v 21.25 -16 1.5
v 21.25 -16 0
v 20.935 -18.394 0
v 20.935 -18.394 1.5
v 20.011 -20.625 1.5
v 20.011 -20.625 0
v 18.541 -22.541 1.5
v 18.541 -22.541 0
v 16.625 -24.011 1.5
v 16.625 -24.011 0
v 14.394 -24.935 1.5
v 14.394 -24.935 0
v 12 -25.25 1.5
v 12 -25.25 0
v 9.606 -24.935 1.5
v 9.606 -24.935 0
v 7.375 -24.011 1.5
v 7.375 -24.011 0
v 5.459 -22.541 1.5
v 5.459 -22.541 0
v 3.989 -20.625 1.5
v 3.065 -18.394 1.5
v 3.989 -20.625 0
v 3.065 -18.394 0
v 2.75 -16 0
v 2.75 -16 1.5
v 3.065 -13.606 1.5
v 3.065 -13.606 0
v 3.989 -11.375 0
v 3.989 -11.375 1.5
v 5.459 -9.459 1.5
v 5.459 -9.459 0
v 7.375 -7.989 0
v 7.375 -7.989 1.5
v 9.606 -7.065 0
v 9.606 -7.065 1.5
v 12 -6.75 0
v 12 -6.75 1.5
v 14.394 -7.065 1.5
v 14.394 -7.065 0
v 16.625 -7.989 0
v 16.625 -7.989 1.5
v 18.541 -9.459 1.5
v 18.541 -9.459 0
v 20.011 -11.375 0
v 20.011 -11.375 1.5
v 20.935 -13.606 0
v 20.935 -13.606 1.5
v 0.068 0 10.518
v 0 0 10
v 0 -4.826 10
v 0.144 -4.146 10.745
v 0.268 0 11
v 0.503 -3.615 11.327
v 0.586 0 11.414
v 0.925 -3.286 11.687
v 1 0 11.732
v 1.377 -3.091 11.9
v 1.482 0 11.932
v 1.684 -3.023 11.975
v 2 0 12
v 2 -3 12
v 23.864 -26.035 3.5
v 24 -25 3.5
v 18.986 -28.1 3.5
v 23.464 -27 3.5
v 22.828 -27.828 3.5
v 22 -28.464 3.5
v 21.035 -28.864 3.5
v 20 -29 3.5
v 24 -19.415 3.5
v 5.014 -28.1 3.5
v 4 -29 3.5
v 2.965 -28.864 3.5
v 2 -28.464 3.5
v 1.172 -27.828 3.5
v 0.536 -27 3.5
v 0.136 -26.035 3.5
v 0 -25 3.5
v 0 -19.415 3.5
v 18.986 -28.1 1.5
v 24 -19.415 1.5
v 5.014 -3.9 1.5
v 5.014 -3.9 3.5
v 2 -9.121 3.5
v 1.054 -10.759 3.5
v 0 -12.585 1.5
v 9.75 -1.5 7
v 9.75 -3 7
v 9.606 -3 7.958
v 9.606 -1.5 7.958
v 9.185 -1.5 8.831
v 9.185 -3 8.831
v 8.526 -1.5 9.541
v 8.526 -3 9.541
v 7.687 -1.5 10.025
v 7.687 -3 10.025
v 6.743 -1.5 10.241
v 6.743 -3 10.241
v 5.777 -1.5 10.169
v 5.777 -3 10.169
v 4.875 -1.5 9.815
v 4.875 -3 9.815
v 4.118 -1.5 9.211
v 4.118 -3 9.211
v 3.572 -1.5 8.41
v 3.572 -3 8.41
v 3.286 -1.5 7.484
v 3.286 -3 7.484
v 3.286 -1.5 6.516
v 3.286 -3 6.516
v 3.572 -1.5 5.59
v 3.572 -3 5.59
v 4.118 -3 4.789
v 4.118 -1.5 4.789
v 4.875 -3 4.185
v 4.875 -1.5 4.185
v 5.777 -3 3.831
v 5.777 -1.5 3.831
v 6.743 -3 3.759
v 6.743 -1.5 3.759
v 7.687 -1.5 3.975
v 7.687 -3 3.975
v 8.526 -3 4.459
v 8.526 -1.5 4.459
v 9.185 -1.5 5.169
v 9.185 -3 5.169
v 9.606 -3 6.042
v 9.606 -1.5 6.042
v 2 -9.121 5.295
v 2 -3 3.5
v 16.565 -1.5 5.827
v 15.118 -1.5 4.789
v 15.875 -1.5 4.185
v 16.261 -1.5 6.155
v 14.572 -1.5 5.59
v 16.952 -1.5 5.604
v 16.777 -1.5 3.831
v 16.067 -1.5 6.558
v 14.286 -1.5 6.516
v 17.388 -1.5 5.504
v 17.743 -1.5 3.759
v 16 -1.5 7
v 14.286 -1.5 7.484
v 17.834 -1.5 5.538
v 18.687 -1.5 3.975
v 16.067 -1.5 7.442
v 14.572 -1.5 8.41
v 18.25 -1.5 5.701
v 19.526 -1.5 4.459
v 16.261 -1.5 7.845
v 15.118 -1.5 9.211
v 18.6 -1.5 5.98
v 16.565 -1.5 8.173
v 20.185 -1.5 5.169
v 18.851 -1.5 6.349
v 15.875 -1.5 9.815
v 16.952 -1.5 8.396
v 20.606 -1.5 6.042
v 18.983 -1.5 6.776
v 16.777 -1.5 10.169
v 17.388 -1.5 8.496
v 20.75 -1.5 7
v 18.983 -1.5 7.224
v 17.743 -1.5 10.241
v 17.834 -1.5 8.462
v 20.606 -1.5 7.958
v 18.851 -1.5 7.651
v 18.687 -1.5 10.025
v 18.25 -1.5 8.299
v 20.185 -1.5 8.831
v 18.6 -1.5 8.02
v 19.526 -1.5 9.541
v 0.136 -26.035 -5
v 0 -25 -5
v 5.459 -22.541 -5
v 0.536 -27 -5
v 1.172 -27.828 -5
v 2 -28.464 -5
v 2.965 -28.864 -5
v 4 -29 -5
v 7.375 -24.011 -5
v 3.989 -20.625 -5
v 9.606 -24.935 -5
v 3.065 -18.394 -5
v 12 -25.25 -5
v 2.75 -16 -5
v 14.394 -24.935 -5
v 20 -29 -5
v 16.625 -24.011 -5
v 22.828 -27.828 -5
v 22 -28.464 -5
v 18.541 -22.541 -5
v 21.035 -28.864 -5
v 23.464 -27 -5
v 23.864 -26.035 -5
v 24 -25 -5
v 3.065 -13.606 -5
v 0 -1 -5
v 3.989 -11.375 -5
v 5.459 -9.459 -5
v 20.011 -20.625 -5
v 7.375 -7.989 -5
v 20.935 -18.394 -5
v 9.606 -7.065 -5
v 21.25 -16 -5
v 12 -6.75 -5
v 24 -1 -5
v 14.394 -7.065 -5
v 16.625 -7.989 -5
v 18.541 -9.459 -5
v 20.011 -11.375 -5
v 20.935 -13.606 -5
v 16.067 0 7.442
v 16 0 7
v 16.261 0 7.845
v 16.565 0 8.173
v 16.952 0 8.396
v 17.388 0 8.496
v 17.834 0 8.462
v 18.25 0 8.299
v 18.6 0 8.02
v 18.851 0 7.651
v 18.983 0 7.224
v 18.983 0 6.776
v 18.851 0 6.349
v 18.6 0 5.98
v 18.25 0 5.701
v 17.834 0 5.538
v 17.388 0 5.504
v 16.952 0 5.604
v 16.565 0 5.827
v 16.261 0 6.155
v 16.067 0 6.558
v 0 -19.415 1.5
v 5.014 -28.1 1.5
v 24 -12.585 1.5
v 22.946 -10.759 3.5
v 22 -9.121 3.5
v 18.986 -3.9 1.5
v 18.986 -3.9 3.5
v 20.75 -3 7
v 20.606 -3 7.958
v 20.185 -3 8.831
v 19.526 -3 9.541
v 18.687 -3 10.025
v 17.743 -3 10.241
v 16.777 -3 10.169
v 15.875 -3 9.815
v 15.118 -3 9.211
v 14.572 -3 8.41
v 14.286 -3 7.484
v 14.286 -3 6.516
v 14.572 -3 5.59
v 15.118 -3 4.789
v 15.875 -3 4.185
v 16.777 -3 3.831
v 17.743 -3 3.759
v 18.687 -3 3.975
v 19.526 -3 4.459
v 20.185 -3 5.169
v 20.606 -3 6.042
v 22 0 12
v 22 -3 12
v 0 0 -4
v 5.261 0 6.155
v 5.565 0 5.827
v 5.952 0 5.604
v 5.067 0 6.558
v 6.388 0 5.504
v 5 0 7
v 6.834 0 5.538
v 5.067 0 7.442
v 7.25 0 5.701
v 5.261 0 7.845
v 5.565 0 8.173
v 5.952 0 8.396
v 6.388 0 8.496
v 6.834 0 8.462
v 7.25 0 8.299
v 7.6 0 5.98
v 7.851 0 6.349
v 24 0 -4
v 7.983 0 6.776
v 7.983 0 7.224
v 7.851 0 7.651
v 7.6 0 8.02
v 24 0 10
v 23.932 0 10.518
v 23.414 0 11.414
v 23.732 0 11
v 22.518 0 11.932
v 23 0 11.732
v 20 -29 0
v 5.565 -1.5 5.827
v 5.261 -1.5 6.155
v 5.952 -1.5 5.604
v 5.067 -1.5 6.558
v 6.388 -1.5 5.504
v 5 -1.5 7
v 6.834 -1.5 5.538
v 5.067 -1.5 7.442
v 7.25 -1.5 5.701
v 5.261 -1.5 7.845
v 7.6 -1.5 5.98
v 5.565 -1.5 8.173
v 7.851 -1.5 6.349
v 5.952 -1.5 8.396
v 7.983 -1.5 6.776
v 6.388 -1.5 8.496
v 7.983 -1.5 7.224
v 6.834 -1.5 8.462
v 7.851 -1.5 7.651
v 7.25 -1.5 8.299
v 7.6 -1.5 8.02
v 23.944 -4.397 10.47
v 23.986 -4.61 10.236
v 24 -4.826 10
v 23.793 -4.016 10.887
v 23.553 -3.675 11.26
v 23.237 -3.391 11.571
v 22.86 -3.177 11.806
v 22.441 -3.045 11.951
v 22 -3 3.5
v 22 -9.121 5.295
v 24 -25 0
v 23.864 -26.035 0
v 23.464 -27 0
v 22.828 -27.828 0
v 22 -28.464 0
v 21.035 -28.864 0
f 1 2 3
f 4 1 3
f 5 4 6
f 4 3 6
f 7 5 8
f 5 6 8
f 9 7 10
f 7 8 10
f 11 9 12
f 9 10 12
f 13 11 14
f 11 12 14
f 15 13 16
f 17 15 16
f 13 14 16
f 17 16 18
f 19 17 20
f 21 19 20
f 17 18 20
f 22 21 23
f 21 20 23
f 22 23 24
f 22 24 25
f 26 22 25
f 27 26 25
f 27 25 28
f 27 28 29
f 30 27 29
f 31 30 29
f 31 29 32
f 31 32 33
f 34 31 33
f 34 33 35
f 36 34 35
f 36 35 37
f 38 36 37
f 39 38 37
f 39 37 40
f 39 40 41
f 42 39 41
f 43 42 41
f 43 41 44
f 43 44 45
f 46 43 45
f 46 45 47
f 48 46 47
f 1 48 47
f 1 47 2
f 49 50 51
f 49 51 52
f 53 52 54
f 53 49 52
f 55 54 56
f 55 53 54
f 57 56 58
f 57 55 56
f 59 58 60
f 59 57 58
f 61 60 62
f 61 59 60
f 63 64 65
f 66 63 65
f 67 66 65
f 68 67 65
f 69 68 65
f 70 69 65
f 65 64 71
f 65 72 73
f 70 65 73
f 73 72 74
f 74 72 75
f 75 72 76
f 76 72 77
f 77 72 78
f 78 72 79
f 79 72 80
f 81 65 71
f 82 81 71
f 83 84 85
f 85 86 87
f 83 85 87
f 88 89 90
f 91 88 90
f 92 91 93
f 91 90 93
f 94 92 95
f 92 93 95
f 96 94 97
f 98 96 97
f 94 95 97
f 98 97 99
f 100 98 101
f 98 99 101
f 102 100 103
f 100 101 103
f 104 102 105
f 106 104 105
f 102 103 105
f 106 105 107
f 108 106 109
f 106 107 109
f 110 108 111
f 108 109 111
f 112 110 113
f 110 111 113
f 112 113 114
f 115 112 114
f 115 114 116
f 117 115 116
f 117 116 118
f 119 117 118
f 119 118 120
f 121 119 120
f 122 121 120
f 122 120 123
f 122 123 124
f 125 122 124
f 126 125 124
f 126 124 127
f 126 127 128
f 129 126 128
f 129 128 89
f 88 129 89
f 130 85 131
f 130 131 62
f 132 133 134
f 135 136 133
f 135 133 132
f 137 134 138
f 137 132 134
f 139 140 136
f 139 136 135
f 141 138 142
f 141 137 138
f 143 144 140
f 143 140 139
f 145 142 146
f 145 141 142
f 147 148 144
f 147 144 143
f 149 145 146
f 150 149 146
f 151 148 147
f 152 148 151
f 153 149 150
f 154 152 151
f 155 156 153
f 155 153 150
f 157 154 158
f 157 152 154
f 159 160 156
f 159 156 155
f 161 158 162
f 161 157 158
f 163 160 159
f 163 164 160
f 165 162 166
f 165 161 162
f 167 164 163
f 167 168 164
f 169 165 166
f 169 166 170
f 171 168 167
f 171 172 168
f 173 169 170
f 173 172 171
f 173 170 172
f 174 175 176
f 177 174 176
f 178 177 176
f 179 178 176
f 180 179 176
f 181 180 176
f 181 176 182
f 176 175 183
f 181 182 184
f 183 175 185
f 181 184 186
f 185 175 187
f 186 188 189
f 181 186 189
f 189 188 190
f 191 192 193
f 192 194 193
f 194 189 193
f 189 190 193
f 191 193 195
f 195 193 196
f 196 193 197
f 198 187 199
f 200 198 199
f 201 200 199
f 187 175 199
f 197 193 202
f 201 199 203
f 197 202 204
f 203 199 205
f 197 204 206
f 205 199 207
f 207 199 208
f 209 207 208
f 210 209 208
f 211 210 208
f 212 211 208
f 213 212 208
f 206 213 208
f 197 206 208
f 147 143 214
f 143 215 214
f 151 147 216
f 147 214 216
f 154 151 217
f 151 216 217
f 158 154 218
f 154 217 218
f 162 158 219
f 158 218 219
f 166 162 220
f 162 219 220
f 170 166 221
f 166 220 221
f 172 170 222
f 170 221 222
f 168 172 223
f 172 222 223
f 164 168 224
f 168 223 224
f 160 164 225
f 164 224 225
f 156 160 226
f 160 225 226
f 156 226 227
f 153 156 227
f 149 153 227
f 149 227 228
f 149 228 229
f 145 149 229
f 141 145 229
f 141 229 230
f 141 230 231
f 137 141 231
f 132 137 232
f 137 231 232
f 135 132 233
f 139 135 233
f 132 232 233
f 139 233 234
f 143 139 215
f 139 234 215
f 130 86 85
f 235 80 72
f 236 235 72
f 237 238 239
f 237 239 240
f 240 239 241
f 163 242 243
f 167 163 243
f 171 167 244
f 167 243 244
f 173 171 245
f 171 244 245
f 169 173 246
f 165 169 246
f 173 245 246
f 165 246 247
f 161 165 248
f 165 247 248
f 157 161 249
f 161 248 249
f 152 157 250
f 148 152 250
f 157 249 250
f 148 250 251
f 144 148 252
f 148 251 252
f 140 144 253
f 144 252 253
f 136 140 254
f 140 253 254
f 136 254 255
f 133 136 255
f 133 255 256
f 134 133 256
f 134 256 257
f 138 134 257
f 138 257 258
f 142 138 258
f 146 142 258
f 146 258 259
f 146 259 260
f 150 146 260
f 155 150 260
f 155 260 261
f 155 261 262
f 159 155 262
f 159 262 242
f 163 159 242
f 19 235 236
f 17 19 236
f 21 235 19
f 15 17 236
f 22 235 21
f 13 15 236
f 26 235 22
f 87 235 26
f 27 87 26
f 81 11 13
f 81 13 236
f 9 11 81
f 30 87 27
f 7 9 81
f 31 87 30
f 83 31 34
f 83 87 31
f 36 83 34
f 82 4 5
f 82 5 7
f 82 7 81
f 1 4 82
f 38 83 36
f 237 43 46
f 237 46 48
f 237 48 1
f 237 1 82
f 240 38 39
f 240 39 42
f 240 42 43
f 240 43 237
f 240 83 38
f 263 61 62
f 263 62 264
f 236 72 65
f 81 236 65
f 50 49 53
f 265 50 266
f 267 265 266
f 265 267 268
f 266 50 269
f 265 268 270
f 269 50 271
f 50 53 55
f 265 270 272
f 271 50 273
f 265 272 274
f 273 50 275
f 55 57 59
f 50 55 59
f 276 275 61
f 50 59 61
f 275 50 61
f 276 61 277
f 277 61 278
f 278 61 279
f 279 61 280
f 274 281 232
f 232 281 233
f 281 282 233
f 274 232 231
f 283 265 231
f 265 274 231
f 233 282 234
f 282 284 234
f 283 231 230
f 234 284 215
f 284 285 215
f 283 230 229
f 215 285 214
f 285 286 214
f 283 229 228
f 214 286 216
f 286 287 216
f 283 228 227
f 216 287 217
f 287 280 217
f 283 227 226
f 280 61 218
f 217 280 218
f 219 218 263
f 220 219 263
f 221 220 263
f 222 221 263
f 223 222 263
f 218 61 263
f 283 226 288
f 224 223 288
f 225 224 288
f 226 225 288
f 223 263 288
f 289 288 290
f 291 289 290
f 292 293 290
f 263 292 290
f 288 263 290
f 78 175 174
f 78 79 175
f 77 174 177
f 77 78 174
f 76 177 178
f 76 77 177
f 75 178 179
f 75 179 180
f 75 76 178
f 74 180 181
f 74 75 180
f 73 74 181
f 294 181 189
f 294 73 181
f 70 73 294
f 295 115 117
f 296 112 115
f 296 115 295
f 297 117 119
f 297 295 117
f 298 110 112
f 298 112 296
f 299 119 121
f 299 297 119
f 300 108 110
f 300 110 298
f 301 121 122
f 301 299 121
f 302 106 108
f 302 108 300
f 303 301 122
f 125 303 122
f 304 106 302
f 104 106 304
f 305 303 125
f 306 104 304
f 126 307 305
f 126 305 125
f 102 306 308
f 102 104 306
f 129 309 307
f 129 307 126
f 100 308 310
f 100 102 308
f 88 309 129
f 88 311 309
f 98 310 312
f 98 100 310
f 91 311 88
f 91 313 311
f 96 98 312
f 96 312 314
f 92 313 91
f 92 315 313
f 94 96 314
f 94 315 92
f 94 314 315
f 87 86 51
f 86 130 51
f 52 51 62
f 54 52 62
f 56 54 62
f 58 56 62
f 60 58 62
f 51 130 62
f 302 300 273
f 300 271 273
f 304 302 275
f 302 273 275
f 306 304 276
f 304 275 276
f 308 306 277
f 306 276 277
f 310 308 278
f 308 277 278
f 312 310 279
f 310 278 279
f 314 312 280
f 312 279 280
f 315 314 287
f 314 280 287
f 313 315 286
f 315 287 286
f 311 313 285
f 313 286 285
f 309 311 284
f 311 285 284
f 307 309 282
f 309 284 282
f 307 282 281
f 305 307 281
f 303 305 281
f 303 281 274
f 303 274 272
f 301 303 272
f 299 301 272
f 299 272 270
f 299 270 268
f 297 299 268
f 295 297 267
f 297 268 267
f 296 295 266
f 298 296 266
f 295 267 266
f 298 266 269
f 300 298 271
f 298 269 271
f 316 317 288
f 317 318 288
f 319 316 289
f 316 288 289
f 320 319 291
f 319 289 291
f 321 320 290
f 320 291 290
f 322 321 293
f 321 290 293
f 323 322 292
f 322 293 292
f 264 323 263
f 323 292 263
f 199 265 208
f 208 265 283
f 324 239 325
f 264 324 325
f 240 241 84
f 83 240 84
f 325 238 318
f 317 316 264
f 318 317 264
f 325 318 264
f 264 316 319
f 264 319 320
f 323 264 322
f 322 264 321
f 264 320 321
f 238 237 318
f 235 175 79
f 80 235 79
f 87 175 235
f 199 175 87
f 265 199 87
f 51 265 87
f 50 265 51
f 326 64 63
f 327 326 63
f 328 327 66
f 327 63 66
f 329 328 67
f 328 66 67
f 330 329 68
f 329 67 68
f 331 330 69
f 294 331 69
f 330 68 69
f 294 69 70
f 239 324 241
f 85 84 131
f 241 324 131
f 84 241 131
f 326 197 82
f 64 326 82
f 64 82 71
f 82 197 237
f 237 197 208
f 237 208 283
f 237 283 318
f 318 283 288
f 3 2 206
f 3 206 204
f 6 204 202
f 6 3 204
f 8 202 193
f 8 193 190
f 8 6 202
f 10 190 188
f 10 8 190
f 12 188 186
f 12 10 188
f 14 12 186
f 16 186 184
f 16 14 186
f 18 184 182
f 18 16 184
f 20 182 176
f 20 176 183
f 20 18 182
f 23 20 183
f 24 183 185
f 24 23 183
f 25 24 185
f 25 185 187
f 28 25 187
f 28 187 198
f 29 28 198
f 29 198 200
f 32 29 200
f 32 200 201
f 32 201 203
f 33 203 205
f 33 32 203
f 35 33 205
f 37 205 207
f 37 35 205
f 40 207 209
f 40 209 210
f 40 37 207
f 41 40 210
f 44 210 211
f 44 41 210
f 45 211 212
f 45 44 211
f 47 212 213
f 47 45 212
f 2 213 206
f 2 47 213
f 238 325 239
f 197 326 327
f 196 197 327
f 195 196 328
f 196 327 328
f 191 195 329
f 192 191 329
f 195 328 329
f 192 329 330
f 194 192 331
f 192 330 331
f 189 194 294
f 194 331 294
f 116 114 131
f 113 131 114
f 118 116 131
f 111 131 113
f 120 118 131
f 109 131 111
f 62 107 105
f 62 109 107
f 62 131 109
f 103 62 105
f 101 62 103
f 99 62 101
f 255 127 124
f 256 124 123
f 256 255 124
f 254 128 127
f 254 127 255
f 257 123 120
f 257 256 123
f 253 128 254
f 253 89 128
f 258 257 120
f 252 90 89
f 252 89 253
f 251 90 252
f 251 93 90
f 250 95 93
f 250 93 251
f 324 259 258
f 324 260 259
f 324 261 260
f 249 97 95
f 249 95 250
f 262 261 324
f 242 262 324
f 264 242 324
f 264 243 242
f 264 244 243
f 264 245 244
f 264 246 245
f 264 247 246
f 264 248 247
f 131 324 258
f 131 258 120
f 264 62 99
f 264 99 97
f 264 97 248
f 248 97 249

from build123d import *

# Parameters (mm, degrees)
F0_W           = 24
F0_H           = 12
F1_DEPTH       = 3
F3_D           = 3
F3_CBORE_D     = 6.5
F3_CBORE_DEPTH = 1.5
F4_DEPTH       = 26
F7_R           = 4
F8_R           = 9.25
F9_DEPTH       = 25
F10_DEPTH      = 5
F11_DEPTH      = 2
F2_W           = 2
F2_H           = 8.5
F12_REACH      = 34.7331245983
F5_W           = 2
F5_H           = 8.5
F13_REACH      = 34.7331245983
F14_SIZE       = 1
F15_R          = 2
F17_DEPTH      = 25


# Not quite as in the source:
# - a feature names something its author has since deleted; it is built from what else it names


with BuildPart() as f1:
    # F0 (on Front) → F1 (new body)
    with BuildSketch(Plane.XZ):
        with Locations((12, 6)):
            Rectangle(F0_W, F0_H)
    extrude(amount=F1_DEPTH)

    # F3 (through all)
    with Locations(Plane.XZ.offset(3)):
        with Locations((6.5, 7), (17.5, 7)):
            CounterBoreHole(F3_D / 2, F3_CBORE_D / 2, F3_CBORE_DEPTH)

    # F2 (on face) → F4 (join)
    with BuildSketch(Plane.XZ.offset(3)):
        Polygon((0, 3.5), (0, 0), (24, 0), (24, 3.5), (22, 3.5), (2, 3.5), align=None)
    extrude(amount=F4_DEPTH)

    # F7
    f7_edges = [f1.edges().sort_by_distance(p)[0] for p in [
        (24, -29, 1.75),
        (0, -29, 1.75),
    ]]
    fillet(f7_edges, radius=F7_R)

    # F8 (on face) → F9 (cut)
    with BuildSketch(Plane(origin=(0, 0, 0), x_dir=(1, 0, 0), z_dir=(0, 0, -1))):
        with Locations((12, 16)):
            Circle(F8_R)
    extrude(amount=-F9_DEPTH, mode=Mode.SUBTRACT)

    # F10 (add): a face of the model
    f10_faces = [f1.faces().sort_by_distance(p)[0] for p in [
        (0.3764306045, -12.5, 0),
    ]]
    extrude(f10_faces, amount=F10_DEPTH)

    # F6 (on face) → F11 (cut)
    with BuildSketch(Plane.XY.offset(3.5)):
        Polygon((0, -19.4153903092), (5.0140617428, -28.1), (18.9859382572, -28.1), (24, -19.4153903092), (24, -12.5846096908), (18.9859382572, -3.9), (5.0140617428, -3.9), (0, -12.5846096908), align=None)
    extrude(amount=-F11_DEPTH, mode=Mode.SUBTRACT)

    f12_end = Plane(origin=(2.5070308714, -8.2423048454, 2.5), x_dir=(0.5, 0.8660254038, 0), z_dir=(0.8660254038, -0.5, 0))
    # F2 (on face) → F12 (join, up to a plane its end follows)
    with BuildSketch(Plane.XZ.offset(3)):
        with Locations((1, 7.75)):
            Rectangle(F2_W, F2_H)
    f12_long = extrude(amount=F12_REACH, mode=Mode.PRIVATE)
    add(split(f12_long, bisect_by=f12_end, keep=Keep.BOTTOM, mode=Mode.PRIVATE))

    f13_end = Plane(origin=(21.4929691286, -8.2423048454, 2.5), x_dir=(0.5, -0.8660254038, 0), z_dir=(-0.8660254038, -0.5, 0))
    # F5 (on face) → F13 (join, up to a plane its end follows)
    with BuildSketch(Plane.XZ.offset(3)):
        with Locations((23, 7.75)):
            Rectangle(F5_W, F5_H)
    f13_long = extrude(amount=F13_REACH, mode=Mode.PRIVATE)
    add(split(f13_long, bisect_by=f13_end, keep=Keep.BOTTOM, mode=Mode.PRIVATE))

    # F14
    f14_edges = [f1.edges().sort_by_distance(p)[0] for p in [
        (12, 0, -5),
    ]]
    chamfer(f14_edges, length=F14_SIZE)

    # F15
    f15_edges = [f1.edges().sort_by_distance(p)[0] for p in [
        (24, -6.292305, 12),
        (0, -6.292305, 12),
    ]]
    fillet(f15_edges, radius=F15_R)

    # F16 (on face) → F17 (cut)
    with BuildSketch(Plane.YZ.offset(24)):
        Polygon((-12.5846096908, 12), (-12.5846096908, 1.5), (-3, 12), align=None)
    extrude(amount=-F17_DEPTH, mode=Mode.SUBTRACT)


solid = f1.part
